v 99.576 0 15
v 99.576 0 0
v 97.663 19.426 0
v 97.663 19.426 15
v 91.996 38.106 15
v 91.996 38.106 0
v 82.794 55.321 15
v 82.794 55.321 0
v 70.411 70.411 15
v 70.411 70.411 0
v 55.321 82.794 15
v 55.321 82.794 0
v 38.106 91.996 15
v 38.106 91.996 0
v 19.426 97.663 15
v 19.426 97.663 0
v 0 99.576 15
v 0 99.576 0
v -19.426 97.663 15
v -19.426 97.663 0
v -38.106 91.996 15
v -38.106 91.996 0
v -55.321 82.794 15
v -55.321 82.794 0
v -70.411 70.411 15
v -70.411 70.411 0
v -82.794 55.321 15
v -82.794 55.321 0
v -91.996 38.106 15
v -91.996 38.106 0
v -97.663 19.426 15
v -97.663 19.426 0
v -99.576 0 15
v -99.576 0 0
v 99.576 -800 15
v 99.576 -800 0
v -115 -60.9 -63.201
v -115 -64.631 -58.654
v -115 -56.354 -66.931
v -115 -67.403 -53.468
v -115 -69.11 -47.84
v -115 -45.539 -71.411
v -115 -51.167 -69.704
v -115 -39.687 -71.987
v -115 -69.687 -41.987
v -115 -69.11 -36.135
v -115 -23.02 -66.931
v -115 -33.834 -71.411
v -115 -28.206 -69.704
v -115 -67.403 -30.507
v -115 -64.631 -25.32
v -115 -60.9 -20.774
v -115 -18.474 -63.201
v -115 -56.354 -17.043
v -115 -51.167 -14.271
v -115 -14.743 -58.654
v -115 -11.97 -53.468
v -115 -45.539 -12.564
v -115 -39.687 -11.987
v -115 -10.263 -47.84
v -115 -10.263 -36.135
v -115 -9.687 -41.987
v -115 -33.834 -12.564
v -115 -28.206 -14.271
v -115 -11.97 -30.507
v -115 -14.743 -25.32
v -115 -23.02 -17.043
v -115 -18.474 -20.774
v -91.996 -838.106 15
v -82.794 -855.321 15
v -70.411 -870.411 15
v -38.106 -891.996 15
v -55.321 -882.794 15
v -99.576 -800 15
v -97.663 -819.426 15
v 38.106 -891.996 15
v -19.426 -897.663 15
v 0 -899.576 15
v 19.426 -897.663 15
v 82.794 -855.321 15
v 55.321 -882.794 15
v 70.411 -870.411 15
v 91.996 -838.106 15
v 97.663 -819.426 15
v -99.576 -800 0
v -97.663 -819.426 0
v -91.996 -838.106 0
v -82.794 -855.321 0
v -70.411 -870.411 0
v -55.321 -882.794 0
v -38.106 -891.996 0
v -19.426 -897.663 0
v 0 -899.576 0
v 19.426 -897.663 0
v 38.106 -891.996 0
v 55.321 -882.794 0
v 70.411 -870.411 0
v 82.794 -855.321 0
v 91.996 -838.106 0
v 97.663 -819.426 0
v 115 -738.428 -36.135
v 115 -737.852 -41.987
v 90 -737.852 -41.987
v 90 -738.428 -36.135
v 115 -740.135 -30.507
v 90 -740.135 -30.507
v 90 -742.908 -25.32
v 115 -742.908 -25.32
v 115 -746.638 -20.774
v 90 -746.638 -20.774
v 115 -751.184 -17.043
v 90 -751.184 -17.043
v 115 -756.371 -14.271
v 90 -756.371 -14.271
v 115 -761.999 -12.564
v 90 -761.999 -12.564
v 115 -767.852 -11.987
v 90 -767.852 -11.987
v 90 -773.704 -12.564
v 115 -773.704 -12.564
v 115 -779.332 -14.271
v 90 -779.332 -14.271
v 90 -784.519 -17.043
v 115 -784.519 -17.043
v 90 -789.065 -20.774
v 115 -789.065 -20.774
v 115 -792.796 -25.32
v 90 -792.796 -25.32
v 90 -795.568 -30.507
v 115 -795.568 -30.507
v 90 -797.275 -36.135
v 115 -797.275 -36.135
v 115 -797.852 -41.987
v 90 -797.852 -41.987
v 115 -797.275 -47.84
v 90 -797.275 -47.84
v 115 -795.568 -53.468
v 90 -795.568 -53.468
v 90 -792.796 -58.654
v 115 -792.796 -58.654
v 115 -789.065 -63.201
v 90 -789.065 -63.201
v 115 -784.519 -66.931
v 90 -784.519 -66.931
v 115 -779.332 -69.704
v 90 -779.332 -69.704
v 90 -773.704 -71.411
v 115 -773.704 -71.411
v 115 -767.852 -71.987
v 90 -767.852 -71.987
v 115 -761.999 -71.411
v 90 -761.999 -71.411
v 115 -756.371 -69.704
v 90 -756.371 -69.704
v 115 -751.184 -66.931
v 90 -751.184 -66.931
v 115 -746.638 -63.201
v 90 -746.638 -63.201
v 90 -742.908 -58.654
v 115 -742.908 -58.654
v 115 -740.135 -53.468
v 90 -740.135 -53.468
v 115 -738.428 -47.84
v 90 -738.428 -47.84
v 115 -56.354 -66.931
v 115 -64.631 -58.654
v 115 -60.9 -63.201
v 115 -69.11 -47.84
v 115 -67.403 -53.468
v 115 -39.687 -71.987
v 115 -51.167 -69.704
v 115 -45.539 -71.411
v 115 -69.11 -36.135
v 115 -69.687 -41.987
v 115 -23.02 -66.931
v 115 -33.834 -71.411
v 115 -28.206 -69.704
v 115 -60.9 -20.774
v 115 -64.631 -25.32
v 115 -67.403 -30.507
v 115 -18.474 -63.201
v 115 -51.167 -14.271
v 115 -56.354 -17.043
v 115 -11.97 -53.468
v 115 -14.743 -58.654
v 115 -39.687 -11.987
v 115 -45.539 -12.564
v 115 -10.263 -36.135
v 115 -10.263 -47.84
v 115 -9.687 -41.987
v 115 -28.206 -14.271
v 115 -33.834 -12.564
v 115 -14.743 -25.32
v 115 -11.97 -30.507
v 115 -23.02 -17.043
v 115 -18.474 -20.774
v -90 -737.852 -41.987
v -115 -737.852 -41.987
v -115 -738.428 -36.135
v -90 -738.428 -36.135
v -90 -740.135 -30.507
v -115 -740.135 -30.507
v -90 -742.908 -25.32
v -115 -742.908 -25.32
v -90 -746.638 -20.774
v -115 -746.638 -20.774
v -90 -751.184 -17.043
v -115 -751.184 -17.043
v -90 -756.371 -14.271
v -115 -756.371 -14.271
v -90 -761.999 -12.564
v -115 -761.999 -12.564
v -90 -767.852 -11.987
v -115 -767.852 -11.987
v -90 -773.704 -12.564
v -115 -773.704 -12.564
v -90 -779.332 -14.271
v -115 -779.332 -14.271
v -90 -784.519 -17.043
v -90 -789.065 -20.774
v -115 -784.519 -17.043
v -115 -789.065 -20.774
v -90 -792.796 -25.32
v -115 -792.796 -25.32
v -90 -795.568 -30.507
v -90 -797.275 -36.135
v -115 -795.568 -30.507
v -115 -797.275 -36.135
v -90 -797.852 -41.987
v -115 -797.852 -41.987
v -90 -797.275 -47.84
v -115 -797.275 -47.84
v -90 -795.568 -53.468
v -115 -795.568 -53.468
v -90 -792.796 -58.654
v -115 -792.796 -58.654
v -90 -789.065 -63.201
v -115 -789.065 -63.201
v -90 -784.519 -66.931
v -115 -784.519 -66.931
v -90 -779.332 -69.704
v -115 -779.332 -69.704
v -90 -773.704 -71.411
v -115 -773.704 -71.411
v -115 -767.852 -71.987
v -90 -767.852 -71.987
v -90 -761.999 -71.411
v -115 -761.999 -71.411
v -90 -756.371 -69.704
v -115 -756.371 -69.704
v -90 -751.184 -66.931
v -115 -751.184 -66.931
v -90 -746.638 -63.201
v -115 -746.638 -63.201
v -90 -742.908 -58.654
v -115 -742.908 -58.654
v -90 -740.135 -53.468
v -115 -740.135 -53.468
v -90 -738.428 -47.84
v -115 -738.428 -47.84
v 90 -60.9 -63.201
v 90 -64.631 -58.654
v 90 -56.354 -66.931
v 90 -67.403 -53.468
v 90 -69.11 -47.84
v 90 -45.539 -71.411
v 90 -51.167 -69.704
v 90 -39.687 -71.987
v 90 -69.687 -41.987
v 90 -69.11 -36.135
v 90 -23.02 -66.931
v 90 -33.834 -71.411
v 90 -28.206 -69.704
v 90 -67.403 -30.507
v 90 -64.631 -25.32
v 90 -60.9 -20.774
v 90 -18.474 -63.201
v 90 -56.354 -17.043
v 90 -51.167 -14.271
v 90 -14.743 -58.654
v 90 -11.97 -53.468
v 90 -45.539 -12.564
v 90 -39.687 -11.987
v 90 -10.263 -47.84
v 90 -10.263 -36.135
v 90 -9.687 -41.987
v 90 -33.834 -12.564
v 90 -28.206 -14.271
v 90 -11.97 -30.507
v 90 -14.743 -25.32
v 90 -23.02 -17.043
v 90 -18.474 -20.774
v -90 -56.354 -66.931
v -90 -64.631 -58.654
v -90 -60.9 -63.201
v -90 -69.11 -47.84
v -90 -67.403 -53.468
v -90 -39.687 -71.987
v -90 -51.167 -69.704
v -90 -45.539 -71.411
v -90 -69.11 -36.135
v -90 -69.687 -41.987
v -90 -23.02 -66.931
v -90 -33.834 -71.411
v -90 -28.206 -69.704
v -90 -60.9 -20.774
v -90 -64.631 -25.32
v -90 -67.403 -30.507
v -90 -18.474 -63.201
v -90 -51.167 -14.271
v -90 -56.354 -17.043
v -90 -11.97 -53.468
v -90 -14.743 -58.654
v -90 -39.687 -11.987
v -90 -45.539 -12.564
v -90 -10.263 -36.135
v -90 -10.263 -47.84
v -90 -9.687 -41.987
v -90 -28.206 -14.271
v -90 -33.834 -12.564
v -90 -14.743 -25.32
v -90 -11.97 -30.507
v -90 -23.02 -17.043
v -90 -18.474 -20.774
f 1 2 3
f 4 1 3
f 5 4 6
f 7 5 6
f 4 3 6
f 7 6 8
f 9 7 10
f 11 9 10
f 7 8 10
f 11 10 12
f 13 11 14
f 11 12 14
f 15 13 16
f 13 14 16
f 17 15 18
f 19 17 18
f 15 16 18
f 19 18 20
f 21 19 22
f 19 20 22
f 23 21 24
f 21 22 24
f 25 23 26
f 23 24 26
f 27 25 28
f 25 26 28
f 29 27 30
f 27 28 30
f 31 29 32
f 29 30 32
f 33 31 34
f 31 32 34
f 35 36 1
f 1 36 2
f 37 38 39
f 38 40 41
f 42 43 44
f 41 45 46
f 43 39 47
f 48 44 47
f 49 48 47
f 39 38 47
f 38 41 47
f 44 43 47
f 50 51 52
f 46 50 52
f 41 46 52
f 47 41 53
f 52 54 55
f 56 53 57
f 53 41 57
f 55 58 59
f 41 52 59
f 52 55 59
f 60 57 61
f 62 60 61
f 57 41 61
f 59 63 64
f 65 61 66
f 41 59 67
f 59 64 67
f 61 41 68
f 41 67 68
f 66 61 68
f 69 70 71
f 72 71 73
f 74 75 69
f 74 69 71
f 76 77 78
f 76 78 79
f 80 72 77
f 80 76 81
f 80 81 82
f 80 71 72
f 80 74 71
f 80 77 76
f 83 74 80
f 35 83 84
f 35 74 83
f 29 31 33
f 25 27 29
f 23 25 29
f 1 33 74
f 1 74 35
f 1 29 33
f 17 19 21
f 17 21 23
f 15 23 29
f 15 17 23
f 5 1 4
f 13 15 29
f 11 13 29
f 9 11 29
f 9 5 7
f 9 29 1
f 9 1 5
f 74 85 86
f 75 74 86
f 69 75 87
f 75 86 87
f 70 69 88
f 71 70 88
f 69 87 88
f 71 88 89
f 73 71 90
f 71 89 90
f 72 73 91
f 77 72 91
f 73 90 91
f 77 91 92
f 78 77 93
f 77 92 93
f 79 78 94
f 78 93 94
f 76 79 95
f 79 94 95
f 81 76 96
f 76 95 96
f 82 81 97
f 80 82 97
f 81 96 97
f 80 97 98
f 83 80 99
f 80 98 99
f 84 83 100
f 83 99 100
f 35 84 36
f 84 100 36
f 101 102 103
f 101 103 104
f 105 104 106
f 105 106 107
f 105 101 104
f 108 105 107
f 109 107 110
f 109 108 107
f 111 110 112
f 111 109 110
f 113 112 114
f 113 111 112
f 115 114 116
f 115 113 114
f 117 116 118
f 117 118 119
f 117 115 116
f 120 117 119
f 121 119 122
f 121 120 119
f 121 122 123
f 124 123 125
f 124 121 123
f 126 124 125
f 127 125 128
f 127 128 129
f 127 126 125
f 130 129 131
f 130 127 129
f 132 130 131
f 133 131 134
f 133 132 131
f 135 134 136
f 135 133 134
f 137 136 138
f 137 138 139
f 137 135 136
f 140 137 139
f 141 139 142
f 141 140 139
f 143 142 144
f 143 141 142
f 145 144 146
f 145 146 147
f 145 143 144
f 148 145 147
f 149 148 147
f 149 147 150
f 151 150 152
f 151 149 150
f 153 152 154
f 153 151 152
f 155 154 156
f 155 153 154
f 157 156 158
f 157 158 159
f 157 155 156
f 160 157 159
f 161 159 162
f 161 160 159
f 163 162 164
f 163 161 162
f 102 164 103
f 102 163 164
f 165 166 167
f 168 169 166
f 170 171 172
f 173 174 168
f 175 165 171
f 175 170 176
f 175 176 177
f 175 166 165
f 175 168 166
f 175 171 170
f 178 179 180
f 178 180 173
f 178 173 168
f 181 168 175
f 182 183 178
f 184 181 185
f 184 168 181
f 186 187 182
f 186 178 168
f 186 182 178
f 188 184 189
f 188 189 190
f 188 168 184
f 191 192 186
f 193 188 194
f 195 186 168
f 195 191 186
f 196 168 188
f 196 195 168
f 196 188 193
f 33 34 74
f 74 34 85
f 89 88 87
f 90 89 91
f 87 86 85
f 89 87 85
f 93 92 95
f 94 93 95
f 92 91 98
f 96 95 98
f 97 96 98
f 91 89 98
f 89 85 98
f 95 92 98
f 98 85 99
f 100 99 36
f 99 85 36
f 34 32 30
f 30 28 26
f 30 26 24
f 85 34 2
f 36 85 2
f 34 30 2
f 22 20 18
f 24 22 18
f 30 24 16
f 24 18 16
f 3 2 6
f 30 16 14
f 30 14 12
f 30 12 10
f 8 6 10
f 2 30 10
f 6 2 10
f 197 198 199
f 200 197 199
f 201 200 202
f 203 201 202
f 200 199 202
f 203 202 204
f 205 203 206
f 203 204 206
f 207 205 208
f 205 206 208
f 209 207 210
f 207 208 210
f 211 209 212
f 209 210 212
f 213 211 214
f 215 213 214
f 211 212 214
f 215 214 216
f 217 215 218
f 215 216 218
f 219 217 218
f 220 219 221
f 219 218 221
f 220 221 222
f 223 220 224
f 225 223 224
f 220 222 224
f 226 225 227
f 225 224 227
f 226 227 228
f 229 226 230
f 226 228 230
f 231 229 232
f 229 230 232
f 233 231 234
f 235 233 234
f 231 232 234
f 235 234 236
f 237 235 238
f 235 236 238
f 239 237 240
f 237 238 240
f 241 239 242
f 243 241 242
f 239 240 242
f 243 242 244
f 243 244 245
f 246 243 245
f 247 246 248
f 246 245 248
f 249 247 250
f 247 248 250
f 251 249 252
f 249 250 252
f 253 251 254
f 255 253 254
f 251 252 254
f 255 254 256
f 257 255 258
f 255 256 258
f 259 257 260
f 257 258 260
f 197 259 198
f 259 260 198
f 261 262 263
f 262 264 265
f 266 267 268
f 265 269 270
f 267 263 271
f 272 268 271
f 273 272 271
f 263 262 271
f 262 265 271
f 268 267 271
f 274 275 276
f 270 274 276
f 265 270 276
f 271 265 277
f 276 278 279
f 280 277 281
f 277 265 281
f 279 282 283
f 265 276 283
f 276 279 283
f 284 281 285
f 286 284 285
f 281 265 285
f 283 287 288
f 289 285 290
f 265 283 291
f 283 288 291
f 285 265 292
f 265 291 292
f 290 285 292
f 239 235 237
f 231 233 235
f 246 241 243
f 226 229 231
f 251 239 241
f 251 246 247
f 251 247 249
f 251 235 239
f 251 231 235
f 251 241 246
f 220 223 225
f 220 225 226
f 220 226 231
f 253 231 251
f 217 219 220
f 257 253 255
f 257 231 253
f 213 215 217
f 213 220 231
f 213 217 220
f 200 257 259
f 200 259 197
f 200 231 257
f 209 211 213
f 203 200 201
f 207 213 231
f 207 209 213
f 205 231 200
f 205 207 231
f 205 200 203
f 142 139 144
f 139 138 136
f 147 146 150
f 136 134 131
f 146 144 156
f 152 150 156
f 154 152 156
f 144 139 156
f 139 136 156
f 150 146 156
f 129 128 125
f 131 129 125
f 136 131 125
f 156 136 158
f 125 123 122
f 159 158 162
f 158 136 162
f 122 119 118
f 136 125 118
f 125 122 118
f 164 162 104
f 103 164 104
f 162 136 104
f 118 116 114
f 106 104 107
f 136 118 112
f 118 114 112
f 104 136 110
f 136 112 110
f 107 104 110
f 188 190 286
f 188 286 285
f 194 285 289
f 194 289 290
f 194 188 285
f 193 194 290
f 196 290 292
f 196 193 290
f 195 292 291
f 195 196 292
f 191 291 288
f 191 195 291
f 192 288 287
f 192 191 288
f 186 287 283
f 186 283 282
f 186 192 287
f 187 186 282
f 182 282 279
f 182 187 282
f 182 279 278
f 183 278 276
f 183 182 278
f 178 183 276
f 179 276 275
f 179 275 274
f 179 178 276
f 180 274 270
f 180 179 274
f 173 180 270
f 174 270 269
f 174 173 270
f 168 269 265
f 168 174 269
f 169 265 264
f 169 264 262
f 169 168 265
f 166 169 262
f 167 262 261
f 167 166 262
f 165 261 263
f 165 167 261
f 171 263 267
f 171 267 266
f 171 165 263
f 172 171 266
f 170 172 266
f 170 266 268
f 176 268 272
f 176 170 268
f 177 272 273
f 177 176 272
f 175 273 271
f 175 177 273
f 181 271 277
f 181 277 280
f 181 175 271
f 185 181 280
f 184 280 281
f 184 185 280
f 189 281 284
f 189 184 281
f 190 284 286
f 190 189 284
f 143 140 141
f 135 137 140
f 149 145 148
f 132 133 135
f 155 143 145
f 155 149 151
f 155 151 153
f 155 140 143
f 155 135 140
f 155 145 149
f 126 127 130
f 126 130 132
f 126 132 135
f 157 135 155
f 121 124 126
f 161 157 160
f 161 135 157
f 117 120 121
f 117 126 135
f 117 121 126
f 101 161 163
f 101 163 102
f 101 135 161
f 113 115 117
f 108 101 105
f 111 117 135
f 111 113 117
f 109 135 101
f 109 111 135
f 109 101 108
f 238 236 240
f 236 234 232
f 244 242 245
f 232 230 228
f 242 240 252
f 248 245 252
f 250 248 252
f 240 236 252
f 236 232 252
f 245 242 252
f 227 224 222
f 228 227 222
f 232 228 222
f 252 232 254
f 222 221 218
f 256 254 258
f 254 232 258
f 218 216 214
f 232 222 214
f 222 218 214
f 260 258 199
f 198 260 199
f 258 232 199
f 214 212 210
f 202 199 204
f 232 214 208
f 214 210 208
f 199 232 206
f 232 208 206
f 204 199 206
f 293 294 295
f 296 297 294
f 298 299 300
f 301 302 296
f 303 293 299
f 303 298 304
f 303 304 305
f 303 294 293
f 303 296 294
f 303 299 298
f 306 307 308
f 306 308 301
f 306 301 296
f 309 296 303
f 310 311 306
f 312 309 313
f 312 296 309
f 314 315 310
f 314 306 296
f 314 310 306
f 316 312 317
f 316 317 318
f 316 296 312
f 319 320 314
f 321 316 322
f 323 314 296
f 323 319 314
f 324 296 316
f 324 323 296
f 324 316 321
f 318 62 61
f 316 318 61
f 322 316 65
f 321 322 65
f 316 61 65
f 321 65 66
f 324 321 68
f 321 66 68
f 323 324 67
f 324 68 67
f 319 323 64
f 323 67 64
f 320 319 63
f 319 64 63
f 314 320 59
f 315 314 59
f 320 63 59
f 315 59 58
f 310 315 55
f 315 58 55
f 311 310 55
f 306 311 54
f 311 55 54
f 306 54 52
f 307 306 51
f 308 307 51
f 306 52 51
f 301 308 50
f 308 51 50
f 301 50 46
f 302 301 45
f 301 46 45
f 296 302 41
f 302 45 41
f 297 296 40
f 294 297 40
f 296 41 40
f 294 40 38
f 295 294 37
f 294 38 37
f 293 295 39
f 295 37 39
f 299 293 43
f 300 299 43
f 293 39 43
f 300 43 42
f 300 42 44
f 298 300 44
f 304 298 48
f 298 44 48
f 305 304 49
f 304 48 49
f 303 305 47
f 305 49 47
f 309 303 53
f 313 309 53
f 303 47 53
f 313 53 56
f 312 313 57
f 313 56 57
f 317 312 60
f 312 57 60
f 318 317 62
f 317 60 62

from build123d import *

# Parameters (mm, degrees)
F1_DEPTH = 15
F3_R     = 30
F4_DEPTH = 25


with BuildPart() as f1:
    # F0 (on Top) → F1 (new body)
    with BuildSketch(Plane.XY):
        with BuildLine():
            ThreePointArc((-99.576, 0), (0, -99.576), (99.576, 0))
            ThreePointArc((99.576, 0), (0, 99.576), (-99.576, 0))
        make_face()
        with BuildLine():
            Line((99.576, -800), (99.576, 0))
            ThreePointArc((99.576, 0), (0, -99.576), (-99.576, 0))
            Line((-99.576, 0), (-99.576, -800))
            ThreePointArc((-99.576, -800), (0, -700.424), (99.576, -800))
        make_face()
        with BuildLine():
            ThreePointArc((-99.576, -800), (0, -899.576), (99.576, -800))
            ThreePointArc((99.576, -800), (0, -700.424), (-99.576, -800))
        make_face()
    extrude(amount=F1_DEPTH)


with BuildPart() as f4:
    # F3 (on offset) → F4 (new body)
    with BuildSketch(Plane.YZ.offset(-115)):
        with Locations((-39.686717, -41.987389)):
            Circle(F3_R)
        with Locations((-767.851591, -41.987389)):
            Circle(F3_R)
    extrude(amount=F4_DEPTH)


with BuildPart() as f5_1:
    # F5: instance of F4
    add(f4.part.mirror(Plane.YZ))


solid = Compound([f1.part, f4.part, f5_1.part])
